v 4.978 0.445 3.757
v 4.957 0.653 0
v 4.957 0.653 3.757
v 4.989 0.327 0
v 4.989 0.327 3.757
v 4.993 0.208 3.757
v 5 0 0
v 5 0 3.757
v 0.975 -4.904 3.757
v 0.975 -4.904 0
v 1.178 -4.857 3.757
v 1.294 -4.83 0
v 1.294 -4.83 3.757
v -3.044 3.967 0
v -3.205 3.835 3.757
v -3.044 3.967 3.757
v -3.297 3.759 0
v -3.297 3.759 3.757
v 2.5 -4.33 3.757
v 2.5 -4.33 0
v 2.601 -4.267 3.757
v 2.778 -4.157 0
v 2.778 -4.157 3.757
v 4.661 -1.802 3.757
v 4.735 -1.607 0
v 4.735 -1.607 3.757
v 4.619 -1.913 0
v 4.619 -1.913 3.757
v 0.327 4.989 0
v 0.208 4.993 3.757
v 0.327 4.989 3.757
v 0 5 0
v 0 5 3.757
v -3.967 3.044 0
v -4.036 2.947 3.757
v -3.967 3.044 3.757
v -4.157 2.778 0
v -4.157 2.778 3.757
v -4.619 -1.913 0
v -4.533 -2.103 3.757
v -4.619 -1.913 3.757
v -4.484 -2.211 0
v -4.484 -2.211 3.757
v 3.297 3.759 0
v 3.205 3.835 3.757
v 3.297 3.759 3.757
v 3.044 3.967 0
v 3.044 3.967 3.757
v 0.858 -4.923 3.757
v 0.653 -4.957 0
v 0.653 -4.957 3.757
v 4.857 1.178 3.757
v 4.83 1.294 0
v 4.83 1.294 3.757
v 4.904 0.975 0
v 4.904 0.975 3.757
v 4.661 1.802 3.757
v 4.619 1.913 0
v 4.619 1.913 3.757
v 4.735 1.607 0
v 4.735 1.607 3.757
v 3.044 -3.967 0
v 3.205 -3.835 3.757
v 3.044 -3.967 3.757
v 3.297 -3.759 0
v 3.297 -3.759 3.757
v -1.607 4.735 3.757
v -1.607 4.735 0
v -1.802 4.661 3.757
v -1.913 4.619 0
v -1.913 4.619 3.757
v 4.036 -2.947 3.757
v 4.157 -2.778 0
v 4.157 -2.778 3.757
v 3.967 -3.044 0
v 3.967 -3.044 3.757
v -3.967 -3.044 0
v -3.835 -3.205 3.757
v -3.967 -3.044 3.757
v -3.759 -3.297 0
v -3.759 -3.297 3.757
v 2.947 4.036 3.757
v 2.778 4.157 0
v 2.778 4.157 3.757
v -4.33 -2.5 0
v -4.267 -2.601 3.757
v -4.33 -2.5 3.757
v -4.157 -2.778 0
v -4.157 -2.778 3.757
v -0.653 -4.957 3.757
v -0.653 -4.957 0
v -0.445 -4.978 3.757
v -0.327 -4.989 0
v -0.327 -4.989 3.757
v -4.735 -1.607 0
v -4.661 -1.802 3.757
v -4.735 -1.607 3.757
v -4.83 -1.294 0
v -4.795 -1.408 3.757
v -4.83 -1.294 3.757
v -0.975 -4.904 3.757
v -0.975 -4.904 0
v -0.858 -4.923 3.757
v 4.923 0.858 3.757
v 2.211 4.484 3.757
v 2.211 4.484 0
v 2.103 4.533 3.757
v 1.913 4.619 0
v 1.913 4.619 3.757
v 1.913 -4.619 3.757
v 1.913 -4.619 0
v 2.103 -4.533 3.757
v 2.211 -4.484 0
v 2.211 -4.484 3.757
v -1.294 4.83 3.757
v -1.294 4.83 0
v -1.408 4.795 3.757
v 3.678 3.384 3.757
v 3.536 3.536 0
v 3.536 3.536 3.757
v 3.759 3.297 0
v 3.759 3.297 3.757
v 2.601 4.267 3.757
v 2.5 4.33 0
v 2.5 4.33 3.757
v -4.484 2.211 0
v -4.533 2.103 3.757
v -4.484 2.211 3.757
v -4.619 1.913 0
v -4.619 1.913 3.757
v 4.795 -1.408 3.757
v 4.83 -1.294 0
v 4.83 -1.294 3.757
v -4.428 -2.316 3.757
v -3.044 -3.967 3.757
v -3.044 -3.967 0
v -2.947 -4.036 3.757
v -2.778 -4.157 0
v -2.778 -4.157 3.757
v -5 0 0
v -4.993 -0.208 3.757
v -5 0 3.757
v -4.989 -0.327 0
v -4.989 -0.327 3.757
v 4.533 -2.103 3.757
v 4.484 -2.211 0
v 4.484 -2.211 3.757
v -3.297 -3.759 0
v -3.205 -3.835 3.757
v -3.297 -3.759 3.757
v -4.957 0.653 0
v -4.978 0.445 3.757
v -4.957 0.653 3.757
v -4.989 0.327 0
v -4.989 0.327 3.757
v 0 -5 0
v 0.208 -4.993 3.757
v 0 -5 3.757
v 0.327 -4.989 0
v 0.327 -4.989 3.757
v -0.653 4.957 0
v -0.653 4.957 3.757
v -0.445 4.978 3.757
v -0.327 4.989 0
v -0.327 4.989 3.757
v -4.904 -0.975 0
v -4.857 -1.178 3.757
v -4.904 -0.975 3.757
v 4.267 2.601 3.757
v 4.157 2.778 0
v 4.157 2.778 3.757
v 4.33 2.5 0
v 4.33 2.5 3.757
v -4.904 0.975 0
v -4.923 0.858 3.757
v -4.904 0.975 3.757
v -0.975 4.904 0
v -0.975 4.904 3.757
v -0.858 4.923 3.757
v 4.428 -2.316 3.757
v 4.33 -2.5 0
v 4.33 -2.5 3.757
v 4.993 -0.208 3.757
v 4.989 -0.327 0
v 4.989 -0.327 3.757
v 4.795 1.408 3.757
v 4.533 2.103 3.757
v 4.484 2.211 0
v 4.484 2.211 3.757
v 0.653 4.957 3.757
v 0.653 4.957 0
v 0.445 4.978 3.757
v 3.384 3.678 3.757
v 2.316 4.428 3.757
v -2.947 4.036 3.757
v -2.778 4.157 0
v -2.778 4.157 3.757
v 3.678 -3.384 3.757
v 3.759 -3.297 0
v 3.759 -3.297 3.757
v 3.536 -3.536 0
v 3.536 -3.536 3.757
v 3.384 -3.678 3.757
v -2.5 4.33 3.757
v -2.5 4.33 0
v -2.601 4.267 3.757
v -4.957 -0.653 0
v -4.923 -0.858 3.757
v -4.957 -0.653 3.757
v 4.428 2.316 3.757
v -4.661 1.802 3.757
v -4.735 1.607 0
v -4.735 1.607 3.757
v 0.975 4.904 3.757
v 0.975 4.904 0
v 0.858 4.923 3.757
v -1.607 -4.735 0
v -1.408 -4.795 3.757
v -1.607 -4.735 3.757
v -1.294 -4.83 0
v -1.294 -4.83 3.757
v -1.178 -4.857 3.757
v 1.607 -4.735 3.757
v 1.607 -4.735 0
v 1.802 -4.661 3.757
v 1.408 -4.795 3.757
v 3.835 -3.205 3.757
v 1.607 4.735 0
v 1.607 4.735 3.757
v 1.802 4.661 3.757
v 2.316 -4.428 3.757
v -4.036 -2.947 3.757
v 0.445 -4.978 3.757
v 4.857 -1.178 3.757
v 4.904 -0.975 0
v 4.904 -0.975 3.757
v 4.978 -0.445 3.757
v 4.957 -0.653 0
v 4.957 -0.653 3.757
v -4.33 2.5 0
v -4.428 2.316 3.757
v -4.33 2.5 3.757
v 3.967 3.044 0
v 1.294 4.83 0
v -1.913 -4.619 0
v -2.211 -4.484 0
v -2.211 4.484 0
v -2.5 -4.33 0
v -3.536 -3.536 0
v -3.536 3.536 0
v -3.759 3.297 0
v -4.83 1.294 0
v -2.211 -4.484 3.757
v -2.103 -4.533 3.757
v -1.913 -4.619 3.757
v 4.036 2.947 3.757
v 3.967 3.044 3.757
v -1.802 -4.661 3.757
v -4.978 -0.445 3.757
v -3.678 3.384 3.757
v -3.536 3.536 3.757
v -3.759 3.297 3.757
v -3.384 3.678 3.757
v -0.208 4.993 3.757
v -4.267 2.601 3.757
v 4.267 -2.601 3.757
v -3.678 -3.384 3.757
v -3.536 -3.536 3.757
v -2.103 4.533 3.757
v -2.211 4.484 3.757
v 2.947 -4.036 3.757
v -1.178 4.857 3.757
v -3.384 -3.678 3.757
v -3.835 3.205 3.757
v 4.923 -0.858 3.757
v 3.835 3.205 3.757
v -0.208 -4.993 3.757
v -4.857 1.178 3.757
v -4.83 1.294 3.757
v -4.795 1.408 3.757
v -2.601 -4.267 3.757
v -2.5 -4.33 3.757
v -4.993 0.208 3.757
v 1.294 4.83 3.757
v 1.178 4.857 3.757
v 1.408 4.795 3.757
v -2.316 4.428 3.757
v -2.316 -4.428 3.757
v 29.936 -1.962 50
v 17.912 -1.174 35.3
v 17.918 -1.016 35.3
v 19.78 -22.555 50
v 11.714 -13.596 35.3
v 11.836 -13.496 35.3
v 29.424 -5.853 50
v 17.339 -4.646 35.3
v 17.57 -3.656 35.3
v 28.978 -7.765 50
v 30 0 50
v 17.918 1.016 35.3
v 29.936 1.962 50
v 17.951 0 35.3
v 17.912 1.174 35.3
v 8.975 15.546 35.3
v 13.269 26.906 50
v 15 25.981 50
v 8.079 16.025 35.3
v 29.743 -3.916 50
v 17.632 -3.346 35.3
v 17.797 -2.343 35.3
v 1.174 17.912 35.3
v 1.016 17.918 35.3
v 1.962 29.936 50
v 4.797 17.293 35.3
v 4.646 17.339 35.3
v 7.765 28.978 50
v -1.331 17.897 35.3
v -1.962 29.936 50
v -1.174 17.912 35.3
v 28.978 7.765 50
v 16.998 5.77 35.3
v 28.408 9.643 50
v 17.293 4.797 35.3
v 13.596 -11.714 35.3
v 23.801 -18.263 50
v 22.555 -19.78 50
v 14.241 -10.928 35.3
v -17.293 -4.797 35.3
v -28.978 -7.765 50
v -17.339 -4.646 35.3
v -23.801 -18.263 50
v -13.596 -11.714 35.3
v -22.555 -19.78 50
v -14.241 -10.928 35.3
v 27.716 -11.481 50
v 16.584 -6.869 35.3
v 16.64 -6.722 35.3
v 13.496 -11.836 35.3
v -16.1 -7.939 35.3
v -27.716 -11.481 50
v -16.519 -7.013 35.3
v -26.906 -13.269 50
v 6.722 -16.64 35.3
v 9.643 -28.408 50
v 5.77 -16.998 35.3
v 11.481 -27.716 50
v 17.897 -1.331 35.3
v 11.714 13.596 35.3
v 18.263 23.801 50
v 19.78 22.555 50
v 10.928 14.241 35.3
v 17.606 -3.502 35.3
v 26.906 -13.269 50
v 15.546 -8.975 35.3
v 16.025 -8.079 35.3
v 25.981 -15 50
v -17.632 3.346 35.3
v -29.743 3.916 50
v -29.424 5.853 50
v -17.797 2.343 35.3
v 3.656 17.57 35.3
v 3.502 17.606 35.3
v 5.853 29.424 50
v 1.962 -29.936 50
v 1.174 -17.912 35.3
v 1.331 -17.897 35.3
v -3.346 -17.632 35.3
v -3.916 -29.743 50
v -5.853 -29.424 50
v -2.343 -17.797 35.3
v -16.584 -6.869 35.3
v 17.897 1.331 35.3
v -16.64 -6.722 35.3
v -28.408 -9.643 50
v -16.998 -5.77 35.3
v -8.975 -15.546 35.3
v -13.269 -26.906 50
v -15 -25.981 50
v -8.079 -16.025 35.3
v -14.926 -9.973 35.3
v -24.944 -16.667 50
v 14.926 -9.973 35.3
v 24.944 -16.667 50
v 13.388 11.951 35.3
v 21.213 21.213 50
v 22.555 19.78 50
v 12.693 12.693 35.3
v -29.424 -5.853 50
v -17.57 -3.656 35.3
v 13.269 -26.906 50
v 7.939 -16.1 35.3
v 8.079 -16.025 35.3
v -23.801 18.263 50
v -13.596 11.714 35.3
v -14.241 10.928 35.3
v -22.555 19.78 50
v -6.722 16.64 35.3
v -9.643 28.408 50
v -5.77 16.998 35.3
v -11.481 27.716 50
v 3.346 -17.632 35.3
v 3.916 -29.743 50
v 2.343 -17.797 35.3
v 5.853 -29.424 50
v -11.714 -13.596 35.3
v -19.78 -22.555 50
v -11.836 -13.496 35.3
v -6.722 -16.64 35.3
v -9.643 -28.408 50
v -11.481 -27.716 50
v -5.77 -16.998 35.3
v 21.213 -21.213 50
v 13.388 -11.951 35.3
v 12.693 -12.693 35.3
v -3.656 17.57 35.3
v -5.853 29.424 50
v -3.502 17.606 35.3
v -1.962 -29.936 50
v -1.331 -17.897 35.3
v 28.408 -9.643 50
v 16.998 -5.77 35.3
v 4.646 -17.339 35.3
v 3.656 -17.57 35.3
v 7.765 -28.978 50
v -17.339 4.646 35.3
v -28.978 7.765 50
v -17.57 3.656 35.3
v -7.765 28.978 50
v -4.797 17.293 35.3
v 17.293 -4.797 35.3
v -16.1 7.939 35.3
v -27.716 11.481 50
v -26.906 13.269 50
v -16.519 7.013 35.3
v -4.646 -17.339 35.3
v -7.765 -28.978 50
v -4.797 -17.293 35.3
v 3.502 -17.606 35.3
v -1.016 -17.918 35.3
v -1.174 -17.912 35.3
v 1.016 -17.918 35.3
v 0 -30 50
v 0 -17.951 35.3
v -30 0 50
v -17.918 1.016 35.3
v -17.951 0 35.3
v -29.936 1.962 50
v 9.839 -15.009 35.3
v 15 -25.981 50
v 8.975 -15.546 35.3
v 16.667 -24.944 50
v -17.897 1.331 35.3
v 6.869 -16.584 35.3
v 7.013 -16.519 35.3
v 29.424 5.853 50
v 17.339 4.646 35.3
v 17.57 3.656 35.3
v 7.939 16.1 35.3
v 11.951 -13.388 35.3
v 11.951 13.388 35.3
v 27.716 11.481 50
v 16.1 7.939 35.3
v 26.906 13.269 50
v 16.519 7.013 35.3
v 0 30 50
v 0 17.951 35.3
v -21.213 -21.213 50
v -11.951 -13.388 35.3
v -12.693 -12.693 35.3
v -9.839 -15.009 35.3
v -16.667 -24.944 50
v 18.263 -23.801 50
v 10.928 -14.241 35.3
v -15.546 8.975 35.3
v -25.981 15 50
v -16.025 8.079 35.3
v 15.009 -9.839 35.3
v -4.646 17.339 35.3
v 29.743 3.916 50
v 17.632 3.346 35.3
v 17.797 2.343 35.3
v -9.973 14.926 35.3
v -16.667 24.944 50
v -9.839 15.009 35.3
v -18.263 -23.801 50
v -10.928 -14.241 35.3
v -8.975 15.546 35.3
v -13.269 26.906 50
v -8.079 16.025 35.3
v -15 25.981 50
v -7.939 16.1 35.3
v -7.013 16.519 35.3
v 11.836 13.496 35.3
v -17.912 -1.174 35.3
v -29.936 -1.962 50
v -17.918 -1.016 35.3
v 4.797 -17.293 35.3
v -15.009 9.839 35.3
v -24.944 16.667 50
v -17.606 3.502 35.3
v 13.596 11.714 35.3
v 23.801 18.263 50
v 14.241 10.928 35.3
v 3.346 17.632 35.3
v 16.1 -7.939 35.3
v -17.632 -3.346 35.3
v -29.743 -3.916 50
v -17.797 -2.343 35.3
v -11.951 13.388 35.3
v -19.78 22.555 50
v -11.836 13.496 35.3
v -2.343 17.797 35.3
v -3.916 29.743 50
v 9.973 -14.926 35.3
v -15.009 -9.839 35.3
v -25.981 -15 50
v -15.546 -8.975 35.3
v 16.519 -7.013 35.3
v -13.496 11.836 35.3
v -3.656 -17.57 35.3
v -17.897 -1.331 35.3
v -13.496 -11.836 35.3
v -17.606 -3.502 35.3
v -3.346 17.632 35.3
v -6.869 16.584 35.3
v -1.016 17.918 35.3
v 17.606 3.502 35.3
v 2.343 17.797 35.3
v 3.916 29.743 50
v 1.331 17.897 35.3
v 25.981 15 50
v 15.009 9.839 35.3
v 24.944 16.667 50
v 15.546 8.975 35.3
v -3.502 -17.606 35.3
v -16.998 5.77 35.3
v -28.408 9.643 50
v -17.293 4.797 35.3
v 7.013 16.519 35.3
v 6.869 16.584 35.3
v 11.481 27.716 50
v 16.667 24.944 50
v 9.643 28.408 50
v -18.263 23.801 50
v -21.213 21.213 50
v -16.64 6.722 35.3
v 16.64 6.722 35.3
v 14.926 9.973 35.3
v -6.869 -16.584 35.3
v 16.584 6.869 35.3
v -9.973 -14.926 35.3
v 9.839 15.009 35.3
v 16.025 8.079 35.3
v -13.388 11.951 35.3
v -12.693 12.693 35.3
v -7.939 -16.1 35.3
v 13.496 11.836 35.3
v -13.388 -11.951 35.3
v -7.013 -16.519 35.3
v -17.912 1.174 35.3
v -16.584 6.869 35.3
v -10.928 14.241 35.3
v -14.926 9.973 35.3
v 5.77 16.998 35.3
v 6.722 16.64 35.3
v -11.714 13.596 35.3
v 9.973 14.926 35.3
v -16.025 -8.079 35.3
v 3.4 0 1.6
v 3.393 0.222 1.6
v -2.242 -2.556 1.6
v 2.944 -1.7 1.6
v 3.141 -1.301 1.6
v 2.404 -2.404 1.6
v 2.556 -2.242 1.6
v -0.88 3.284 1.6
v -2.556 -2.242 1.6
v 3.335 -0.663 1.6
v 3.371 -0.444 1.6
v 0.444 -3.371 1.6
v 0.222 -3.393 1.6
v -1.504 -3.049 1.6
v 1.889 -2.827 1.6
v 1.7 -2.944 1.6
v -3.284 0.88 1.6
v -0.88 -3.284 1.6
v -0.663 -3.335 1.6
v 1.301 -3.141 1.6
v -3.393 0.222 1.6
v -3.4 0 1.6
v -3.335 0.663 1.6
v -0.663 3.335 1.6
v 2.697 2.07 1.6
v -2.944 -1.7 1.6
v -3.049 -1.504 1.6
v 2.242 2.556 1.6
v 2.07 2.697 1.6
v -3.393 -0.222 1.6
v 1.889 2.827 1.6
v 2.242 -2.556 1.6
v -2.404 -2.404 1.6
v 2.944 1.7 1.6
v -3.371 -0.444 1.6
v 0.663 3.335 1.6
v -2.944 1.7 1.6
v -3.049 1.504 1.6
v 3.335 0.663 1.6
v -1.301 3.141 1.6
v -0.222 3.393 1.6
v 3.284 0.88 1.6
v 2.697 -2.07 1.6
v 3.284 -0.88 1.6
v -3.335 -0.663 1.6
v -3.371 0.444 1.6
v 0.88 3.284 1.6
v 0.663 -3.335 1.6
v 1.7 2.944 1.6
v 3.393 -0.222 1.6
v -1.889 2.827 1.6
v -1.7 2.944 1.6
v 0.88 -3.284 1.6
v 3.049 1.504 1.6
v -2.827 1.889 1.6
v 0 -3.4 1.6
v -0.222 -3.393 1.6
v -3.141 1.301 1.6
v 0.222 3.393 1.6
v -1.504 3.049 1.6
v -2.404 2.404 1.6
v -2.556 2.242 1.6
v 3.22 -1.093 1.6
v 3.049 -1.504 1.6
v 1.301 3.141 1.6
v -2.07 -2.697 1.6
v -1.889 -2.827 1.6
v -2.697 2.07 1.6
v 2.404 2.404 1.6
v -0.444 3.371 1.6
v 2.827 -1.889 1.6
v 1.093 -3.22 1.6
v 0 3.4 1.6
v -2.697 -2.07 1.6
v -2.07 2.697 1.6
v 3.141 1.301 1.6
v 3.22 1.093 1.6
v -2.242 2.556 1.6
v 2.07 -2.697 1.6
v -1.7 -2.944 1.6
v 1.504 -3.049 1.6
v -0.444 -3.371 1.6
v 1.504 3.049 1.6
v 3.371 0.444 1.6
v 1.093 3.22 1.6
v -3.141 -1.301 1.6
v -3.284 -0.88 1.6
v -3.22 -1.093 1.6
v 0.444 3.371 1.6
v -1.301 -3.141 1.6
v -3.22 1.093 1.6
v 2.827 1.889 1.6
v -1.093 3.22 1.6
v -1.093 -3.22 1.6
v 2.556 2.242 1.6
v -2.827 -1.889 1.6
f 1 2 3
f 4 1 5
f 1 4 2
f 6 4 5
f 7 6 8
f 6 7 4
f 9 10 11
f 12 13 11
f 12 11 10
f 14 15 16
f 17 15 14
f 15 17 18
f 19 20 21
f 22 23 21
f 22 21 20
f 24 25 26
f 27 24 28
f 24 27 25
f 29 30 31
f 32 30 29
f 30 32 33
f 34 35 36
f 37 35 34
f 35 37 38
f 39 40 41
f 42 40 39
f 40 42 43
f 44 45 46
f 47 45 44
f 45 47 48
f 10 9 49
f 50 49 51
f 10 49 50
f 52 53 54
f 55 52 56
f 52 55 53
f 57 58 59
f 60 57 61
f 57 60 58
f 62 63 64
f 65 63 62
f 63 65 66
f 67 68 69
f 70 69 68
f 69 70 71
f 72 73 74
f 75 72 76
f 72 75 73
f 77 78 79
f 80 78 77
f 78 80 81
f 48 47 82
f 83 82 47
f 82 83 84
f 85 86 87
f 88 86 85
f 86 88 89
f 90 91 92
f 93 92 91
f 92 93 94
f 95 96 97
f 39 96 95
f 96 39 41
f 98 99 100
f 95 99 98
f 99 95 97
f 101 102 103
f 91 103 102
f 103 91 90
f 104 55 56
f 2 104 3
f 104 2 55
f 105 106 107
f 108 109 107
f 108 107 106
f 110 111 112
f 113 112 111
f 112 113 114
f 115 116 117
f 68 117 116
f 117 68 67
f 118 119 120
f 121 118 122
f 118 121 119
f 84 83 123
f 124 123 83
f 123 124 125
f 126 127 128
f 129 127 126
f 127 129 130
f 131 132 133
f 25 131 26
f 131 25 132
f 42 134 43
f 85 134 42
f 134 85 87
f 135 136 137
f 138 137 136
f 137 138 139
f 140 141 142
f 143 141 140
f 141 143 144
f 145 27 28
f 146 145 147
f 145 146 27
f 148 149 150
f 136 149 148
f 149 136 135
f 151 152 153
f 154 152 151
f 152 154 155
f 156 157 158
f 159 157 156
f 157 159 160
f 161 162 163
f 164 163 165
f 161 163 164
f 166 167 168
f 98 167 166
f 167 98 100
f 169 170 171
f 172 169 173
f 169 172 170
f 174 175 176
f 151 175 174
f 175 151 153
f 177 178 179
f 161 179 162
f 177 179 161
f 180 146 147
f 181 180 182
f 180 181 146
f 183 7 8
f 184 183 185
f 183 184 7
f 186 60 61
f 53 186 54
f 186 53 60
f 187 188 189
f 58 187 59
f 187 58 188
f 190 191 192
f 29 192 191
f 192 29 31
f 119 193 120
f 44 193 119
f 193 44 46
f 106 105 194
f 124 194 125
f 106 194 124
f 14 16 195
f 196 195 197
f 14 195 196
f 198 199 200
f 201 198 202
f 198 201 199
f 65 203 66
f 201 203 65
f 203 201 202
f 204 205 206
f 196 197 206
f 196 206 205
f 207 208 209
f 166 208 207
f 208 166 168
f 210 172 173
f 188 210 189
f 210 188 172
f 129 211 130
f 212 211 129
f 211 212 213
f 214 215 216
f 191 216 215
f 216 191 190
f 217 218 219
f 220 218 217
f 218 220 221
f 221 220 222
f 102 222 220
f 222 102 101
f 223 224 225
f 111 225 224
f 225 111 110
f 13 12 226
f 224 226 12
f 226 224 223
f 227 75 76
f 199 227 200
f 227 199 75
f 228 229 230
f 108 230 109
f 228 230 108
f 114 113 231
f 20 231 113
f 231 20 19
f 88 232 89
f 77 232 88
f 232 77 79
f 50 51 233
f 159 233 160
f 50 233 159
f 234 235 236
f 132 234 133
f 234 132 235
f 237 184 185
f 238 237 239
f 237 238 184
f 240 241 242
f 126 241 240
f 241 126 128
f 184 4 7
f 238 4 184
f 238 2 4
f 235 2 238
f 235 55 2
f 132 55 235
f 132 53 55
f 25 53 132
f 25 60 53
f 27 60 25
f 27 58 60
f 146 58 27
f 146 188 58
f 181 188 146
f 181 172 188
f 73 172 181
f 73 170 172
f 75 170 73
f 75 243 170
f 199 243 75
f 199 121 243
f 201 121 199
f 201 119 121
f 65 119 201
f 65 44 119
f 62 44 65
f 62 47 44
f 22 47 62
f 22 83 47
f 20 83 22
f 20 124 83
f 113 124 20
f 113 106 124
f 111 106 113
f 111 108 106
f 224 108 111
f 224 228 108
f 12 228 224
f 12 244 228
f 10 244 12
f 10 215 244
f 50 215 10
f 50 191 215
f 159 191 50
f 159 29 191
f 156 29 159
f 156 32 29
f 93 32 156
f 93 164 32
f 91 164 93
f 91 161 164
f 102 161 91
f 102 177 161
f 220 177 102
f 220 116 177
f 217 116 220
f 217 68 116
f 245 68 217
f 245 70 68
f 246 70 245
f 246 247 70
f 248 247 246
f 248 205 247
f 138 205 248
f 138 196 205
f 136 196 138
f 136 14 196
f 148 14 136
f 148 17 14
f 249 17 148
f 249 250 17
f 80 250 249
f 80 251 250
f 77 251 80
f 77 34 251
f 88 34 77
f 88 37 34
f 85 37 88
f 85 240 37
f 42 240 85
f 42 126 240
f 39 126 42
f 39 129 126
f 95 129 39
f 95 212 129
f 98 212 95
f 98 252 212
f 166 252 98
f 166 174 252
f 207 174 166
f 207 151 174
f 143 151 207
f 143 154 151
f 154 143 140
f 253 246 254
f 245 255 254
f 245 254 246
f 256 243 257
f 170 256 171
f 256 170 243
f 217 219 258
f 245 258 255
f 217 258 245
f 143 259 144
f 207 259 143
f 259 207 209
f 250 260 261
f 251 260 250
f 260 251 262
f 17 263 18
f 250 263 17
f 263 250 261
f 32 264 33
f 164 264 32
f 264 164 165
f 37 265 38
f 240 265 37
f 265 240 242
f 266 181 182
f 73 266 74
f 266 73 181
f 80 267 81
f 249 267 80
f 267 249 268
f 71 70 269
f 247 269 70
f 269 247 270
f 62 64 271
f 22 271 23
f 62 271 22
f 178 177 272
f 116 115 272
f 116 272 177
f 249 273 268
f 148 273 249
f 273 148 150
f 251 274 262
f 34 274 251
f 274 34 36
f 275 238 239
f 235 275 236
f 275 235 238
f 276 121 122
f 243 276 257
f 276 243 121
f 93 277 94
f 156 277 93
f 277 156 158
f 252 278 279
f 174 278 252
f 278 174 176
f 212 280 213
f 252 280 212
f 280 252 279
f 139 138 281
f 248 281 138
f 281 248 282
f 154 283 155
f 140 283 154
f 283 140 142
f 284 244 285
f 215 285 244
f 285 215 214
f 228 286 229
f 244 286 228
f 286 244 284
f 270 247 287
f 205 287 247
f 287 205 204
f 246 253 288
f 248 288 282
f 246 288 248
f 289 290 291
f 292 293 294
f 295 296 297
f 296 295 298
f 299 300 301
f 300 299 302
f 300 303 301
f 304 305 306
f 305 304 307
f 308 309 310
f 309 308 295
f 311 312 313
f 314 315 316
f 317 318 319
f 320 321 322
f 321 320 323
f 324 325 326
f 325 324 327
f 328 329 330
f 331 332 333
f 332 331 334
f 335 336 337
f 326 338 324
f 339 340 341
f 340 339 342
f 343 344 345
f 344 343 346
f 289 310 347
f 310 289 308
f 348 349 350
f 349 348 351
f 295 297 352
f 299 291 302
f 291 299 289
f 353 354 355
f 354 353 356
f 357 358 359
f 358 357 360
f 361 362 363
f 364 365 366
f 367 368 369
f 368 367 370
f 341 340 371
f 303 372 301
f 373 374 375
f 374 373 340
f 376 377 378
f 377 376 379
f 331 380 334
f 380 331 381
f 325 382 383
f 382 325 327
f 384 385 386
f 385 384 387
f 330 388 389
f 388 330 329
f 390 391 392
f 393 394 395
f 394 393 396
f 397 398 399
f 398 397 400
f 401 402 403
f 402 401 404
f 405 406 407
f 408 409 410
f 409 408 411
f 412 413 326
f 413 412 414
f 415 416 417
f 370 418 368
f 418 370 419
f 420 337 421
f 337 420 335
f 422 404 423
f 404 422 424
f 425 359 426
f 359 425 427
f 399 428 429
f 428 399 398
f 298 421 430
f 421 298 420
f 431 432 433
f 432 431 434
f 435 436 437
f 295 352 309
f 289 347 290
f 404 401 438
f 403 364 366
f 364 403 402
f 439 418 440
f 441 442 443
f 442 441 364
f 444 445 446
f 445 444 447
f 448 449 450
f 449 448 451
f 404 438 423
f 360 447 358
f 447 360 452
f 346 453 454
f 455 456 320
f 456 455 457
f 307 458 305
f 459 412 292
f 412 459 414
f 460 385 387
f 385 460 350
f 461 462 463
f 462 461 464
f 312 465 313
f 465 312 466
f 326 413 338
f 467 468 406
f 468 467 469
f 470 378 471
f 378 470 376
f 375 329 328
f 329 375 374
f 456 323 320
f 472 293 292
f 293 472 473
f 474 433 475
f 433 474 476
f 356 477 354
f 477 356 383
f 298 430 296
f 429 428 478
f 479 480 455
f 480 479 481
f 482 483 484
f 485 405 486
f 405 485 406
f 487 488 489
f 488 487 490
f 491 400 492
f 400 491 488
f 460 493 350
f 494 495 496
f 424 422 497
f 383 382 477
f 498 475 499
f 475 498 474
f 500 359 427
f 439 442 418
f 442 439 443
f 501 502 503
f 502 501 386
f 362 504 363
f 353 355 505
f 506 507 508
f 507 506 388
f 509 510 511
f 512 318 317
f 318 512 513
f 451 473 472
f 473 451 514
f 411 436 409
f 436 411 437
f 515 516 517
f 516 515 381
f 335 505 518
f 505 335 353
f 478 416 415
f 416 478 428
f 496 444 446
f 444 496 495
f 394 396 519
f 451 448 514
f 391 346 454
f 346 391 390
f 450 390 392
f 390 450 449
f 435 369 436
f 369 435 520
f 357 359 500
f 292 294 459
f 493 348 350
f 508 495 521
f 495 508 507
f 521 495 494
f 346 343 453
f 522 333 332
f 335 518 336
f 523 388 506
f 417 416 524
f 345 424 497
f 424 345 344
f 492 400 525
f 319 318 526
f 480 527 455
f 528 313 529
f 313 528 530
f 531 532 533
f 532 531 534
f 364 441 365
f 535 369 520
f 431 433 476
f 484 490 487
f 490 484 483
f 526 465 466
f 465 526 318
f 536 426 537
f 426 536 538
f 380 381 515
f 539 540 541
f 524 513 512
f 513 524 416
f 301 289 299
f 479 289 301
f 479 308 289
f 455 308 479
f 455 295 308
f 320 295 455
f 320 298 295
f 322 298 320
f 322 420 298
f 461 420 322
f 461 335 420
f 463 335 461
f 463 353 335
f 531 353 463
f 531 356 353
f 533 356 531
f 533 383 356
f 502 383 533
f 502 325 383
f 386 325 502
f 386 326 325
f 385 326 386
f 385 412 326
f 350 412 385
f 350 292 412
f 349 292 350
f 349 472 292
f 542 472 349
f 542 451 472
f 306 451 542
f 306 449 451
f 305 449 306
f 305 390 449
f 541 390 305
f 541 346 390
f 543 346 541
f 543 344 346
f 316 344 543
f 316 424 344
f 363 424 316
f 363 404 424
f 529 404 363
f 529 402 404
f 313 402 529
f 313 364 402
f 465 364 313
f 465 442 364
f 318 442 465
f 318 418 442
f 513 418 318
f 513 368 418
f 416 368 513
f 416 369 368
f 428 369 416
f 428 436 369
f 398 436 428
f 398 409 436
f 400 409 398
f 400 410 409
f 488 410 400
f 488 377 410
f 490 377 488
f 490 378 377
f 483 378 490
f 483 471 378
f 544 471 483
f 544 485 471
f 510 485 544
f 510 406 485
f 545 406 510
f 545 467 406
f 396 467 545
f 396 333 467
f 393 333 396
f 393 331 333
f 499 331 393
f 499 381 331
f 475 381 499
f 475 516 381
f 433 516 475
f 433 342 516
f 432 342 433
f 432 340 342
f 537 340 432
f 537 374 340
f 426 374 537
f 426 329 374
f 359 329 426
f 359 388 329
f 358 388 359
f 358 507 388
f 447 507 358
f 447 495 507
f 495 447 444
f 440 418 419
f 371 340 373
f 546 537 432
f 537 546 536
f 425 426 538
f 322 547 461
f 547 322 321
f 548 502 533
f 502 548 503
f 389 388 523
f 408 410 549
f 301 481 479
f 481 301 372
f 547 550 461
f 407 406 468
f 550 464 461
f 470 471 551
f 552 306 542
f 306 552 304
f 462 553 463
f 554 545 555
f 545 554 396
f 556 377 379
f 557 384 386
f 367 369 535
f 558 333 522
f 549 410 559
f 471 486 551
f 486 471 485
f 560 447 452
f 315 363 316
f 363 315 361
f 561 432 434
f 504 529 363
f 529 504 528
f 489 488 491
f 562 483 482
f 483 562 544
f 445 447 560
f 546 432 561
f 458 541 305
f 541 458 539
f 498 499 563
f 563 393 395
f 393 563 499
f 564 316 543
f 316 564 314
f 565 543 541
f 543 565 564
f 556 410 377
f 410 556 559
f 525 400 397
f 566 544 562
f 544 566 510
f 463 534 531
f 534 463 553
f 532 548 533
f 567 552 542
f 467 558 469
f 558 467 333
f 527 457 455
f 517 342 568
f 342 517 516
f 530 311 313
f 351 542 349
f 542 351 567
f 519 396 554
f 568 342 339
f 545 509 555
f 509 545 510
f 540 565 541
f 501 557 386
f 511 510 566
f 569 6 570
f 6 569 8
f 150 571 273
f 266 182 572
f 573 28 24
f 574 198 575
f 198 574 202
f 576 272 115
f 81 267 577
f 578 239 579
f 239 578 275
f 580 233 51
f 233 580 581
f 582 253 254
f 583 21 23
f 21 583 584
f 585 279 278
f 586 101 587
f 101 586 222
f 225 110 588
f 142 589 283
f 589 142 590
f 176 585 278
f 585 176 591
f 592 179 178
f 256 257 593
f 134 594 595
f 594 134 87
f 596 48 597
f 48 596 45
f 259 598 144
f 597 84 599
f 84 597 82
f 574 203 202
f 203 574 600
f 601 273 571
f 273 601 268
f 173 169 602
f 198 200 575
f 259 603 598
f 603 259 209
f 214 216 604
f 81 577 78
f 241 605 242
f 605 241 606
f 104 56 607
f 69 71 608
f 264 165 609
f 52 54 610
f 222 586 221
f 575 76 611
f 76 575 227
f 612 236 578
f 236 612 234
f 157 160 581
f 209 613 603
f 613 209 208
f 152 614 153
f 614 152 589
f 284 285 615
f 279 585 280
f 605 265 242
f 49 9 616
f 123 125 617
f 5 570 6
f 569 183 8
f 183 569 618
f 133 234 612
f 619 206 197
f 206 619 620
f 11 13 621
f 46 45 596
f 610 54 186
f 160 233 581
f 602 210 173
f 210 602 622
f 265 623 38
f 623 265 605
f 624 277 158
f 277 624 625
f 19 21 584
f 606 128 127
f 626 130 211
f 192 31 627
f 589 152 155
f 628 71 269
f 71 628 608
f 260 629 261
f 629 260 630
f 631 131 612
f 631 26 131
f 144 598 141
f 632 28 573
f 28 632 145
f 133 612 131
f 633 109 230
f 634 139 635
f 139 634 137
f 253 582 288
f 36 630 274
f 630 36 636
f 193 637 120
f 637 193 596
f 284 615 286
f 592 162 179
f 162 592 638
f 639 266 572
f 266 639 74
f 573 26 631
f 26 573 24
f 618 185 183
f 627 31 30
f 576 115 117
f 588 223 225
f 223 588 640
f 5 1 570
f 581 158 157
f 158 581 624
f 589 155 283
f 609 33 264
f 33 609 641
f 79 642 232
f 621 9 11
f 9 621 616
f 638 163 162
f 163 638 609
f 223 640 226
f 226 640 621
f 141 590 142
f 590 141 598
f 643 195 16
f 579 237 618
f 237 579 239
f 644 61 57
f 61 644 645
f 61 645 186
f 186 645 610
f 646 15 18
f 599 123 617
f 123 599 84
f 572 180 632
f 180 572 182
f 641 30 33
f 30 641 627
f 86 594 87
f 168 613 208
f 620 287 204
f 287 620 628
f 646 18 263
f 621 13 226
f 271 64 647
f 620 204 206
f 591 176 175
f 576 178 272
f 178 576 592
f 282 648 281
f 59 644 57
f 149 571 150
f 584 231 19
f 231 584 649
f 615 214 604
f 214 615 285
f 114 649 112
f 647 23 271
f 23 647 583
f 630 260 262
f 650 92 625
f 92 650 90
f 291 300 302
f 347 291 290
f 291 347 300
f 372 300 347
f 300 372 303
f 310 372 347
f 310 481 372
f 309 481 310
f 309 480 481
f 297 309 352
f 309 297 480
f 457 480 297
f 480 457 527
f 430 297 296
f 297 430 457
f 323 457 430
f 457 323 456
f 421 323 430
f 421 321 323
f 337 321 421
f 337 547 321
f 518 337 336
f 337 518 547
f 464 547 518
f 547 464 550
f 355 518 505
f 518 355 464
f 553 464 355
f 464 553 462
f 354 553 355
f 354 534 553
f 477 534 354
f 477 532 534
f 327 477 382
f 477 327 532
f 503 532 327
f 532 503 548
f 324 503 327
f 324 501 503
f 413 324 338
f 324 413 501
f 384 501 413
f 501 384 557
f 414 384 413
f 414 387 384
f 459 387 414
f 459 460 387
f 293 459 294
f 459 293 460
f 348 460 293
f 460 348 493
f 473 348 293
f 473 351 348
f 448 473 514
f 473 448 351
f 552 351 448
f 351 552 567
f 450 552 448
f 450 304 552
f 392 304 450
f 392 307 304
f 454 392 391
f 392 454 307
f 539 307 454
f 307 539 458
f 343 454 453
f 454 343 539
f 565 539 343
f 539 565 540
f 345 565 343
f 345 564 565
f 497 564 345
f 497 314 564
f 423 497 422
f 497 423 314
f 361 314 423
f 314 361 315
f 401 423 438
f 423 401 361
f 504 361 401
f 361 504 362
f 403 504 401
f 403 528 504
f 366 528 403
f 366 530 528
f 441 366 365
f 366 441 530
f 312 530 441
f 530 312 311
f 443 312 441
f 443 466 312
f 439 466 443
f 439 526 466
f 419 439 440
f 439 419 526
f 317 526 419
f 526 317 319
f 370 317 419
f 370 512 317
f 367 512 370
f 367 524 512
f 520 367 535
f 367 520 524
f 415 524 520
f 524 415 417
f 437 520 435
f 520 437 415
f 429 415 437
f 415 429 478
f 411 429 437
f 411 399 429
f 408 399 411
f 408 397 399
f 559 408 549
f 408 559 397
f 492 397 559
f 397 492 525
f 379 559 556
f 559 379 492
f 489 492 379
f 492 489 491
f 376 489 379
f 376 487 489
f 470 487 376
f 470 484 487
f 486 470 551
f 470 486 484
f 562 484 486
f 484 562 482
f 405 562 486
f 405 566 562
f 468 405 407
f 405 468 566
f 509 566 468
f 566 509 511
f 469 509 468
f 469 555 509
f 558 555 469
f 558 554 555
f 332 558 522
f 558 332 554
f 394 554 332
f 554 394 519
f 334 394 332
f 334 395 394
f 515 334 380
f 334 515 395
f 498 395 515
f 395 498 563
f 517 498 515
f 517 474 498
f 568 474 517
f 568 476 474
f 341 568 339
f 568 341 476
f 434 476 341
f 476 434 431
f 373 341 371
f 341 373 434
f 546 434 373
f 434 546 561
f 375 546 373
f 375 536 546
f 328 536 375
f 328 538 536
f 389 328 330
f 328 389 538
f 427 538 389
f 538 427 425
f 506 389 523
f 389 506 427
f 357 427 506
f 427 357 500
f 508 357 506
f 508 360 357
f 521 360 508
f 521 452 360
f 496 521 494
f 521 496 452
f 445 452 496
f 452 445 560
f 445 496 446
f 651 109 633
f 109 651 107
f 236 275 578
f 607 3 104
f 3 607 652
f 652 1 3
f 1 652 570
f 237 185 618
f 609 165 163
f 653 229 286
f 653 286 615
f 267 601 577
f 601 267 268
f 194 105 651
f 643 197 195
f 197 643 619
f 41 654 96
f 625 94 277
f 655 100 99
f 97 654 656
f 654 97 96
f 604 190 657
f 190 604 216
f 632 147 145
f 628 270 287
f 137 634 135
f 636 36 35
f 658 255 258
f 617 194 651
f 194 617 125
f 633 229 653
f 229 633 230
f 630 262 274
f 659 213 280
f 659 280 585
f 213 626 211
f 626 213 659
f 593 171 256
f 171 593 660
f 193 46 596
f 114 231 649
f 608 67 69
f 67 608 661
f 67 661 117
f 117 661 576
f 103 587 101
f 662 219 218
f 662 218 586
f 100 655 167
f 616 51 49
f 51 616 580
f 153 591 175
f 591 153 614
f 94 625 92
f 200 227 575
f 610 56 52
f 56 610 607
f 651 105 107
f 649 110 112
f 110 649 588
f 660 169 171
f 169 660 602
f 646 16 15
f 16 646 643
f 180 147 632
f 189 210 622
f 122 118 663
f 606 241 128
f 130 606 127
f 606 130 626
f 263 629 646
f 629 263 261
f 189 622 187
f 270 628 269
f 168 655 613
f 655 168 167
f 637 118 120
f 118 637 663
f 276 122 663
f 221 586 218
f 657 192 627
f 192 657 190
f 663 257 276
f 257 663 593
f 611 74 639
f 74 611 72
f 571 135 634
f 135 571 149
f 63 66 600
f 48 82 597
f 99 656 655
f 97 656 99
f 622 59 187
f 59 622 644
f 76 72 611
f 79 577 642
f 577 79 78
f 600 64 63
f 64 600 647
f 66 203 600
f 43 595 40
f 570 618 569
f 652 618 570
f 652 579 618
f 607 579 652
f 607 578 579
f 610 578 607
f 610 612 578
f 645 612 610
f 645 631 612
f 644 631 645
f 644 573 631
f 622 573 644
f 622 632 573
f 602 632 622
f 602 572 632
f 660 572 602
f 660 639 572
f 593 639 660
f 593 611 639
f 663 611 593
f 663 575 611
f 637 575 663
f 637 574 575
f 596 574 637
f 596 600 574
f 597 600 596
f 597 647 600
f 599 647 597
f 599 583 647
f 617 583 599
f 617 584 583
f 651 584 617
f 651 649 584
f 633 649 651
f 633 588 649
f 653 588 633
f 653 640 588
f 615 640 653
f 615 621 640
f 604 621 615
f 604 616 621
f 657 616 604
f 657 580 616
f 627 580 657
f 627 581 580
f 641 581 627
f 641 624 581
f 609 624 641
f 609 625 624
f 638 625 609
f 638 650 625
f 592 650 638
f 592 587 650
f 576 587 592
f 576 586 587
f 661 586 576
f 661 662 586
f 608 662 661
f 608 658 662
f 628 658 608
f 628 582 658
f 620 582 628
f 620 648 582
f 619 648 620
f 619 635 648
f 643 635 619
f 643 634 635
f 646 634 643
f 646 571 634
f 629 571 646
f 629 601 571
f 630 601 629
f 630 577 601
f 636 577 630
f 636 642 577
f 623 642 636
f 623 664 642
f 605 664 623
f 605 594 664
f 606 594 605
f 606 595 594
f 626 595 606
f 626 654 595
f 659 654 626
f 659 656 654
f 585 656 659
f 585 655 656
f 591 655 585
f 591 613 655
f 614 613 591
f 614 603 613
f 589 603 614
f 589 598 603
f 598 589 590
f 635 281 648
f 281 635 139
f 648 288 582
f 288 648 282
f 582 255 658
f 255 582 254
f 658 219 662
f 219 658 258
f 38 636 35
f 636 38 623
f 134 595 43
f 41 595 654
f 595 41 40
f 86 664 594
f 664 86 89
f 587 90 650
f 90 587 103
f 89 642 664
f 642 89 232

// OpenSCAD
// Lab funnel - printed upright, open top and bottom
// Units: mm

$fn = 96;

// --- Dimensions ---
spout_od      = 10;    // spout outer diameter (z = 0 to 20)
spout_bore    = 6.8;   // spout bore (od - 2*wall)
cone_top_od   = 60;    // cone rim outer diameter (z = 50)
cone_bottom_od = 10;   // cone outer diameter at z = 20 (spout top)
wall          = 1.6;   // wall thickness everywhere
overlap       = 0.5;   // overlap between spout and cone for a clean union

// Derived
cone_h = 30;           // cone height (z = 20 to 50)

difference() {
    union() {
        // Straight spout
        cylinder(h = 20, d = spout_od);

        // Cone: widens from spout top diameter to rim diameter
        translate([0, 0, 20 - overlap])
            cylinder(h = cone_h + overlap,
                     d1 = cone_bottom_od,
                     d2 = cone_top_od);
    }

    // Through-bore: spout bore up to the cone, then a single cone bore to the rim
    translate([0, 0, wall])
        cylinder(h = cone_h + 2 * wall + overlap,
                 d1 = spout_bore,
                 d2 = cone_top_od - 2 * wall);
}
